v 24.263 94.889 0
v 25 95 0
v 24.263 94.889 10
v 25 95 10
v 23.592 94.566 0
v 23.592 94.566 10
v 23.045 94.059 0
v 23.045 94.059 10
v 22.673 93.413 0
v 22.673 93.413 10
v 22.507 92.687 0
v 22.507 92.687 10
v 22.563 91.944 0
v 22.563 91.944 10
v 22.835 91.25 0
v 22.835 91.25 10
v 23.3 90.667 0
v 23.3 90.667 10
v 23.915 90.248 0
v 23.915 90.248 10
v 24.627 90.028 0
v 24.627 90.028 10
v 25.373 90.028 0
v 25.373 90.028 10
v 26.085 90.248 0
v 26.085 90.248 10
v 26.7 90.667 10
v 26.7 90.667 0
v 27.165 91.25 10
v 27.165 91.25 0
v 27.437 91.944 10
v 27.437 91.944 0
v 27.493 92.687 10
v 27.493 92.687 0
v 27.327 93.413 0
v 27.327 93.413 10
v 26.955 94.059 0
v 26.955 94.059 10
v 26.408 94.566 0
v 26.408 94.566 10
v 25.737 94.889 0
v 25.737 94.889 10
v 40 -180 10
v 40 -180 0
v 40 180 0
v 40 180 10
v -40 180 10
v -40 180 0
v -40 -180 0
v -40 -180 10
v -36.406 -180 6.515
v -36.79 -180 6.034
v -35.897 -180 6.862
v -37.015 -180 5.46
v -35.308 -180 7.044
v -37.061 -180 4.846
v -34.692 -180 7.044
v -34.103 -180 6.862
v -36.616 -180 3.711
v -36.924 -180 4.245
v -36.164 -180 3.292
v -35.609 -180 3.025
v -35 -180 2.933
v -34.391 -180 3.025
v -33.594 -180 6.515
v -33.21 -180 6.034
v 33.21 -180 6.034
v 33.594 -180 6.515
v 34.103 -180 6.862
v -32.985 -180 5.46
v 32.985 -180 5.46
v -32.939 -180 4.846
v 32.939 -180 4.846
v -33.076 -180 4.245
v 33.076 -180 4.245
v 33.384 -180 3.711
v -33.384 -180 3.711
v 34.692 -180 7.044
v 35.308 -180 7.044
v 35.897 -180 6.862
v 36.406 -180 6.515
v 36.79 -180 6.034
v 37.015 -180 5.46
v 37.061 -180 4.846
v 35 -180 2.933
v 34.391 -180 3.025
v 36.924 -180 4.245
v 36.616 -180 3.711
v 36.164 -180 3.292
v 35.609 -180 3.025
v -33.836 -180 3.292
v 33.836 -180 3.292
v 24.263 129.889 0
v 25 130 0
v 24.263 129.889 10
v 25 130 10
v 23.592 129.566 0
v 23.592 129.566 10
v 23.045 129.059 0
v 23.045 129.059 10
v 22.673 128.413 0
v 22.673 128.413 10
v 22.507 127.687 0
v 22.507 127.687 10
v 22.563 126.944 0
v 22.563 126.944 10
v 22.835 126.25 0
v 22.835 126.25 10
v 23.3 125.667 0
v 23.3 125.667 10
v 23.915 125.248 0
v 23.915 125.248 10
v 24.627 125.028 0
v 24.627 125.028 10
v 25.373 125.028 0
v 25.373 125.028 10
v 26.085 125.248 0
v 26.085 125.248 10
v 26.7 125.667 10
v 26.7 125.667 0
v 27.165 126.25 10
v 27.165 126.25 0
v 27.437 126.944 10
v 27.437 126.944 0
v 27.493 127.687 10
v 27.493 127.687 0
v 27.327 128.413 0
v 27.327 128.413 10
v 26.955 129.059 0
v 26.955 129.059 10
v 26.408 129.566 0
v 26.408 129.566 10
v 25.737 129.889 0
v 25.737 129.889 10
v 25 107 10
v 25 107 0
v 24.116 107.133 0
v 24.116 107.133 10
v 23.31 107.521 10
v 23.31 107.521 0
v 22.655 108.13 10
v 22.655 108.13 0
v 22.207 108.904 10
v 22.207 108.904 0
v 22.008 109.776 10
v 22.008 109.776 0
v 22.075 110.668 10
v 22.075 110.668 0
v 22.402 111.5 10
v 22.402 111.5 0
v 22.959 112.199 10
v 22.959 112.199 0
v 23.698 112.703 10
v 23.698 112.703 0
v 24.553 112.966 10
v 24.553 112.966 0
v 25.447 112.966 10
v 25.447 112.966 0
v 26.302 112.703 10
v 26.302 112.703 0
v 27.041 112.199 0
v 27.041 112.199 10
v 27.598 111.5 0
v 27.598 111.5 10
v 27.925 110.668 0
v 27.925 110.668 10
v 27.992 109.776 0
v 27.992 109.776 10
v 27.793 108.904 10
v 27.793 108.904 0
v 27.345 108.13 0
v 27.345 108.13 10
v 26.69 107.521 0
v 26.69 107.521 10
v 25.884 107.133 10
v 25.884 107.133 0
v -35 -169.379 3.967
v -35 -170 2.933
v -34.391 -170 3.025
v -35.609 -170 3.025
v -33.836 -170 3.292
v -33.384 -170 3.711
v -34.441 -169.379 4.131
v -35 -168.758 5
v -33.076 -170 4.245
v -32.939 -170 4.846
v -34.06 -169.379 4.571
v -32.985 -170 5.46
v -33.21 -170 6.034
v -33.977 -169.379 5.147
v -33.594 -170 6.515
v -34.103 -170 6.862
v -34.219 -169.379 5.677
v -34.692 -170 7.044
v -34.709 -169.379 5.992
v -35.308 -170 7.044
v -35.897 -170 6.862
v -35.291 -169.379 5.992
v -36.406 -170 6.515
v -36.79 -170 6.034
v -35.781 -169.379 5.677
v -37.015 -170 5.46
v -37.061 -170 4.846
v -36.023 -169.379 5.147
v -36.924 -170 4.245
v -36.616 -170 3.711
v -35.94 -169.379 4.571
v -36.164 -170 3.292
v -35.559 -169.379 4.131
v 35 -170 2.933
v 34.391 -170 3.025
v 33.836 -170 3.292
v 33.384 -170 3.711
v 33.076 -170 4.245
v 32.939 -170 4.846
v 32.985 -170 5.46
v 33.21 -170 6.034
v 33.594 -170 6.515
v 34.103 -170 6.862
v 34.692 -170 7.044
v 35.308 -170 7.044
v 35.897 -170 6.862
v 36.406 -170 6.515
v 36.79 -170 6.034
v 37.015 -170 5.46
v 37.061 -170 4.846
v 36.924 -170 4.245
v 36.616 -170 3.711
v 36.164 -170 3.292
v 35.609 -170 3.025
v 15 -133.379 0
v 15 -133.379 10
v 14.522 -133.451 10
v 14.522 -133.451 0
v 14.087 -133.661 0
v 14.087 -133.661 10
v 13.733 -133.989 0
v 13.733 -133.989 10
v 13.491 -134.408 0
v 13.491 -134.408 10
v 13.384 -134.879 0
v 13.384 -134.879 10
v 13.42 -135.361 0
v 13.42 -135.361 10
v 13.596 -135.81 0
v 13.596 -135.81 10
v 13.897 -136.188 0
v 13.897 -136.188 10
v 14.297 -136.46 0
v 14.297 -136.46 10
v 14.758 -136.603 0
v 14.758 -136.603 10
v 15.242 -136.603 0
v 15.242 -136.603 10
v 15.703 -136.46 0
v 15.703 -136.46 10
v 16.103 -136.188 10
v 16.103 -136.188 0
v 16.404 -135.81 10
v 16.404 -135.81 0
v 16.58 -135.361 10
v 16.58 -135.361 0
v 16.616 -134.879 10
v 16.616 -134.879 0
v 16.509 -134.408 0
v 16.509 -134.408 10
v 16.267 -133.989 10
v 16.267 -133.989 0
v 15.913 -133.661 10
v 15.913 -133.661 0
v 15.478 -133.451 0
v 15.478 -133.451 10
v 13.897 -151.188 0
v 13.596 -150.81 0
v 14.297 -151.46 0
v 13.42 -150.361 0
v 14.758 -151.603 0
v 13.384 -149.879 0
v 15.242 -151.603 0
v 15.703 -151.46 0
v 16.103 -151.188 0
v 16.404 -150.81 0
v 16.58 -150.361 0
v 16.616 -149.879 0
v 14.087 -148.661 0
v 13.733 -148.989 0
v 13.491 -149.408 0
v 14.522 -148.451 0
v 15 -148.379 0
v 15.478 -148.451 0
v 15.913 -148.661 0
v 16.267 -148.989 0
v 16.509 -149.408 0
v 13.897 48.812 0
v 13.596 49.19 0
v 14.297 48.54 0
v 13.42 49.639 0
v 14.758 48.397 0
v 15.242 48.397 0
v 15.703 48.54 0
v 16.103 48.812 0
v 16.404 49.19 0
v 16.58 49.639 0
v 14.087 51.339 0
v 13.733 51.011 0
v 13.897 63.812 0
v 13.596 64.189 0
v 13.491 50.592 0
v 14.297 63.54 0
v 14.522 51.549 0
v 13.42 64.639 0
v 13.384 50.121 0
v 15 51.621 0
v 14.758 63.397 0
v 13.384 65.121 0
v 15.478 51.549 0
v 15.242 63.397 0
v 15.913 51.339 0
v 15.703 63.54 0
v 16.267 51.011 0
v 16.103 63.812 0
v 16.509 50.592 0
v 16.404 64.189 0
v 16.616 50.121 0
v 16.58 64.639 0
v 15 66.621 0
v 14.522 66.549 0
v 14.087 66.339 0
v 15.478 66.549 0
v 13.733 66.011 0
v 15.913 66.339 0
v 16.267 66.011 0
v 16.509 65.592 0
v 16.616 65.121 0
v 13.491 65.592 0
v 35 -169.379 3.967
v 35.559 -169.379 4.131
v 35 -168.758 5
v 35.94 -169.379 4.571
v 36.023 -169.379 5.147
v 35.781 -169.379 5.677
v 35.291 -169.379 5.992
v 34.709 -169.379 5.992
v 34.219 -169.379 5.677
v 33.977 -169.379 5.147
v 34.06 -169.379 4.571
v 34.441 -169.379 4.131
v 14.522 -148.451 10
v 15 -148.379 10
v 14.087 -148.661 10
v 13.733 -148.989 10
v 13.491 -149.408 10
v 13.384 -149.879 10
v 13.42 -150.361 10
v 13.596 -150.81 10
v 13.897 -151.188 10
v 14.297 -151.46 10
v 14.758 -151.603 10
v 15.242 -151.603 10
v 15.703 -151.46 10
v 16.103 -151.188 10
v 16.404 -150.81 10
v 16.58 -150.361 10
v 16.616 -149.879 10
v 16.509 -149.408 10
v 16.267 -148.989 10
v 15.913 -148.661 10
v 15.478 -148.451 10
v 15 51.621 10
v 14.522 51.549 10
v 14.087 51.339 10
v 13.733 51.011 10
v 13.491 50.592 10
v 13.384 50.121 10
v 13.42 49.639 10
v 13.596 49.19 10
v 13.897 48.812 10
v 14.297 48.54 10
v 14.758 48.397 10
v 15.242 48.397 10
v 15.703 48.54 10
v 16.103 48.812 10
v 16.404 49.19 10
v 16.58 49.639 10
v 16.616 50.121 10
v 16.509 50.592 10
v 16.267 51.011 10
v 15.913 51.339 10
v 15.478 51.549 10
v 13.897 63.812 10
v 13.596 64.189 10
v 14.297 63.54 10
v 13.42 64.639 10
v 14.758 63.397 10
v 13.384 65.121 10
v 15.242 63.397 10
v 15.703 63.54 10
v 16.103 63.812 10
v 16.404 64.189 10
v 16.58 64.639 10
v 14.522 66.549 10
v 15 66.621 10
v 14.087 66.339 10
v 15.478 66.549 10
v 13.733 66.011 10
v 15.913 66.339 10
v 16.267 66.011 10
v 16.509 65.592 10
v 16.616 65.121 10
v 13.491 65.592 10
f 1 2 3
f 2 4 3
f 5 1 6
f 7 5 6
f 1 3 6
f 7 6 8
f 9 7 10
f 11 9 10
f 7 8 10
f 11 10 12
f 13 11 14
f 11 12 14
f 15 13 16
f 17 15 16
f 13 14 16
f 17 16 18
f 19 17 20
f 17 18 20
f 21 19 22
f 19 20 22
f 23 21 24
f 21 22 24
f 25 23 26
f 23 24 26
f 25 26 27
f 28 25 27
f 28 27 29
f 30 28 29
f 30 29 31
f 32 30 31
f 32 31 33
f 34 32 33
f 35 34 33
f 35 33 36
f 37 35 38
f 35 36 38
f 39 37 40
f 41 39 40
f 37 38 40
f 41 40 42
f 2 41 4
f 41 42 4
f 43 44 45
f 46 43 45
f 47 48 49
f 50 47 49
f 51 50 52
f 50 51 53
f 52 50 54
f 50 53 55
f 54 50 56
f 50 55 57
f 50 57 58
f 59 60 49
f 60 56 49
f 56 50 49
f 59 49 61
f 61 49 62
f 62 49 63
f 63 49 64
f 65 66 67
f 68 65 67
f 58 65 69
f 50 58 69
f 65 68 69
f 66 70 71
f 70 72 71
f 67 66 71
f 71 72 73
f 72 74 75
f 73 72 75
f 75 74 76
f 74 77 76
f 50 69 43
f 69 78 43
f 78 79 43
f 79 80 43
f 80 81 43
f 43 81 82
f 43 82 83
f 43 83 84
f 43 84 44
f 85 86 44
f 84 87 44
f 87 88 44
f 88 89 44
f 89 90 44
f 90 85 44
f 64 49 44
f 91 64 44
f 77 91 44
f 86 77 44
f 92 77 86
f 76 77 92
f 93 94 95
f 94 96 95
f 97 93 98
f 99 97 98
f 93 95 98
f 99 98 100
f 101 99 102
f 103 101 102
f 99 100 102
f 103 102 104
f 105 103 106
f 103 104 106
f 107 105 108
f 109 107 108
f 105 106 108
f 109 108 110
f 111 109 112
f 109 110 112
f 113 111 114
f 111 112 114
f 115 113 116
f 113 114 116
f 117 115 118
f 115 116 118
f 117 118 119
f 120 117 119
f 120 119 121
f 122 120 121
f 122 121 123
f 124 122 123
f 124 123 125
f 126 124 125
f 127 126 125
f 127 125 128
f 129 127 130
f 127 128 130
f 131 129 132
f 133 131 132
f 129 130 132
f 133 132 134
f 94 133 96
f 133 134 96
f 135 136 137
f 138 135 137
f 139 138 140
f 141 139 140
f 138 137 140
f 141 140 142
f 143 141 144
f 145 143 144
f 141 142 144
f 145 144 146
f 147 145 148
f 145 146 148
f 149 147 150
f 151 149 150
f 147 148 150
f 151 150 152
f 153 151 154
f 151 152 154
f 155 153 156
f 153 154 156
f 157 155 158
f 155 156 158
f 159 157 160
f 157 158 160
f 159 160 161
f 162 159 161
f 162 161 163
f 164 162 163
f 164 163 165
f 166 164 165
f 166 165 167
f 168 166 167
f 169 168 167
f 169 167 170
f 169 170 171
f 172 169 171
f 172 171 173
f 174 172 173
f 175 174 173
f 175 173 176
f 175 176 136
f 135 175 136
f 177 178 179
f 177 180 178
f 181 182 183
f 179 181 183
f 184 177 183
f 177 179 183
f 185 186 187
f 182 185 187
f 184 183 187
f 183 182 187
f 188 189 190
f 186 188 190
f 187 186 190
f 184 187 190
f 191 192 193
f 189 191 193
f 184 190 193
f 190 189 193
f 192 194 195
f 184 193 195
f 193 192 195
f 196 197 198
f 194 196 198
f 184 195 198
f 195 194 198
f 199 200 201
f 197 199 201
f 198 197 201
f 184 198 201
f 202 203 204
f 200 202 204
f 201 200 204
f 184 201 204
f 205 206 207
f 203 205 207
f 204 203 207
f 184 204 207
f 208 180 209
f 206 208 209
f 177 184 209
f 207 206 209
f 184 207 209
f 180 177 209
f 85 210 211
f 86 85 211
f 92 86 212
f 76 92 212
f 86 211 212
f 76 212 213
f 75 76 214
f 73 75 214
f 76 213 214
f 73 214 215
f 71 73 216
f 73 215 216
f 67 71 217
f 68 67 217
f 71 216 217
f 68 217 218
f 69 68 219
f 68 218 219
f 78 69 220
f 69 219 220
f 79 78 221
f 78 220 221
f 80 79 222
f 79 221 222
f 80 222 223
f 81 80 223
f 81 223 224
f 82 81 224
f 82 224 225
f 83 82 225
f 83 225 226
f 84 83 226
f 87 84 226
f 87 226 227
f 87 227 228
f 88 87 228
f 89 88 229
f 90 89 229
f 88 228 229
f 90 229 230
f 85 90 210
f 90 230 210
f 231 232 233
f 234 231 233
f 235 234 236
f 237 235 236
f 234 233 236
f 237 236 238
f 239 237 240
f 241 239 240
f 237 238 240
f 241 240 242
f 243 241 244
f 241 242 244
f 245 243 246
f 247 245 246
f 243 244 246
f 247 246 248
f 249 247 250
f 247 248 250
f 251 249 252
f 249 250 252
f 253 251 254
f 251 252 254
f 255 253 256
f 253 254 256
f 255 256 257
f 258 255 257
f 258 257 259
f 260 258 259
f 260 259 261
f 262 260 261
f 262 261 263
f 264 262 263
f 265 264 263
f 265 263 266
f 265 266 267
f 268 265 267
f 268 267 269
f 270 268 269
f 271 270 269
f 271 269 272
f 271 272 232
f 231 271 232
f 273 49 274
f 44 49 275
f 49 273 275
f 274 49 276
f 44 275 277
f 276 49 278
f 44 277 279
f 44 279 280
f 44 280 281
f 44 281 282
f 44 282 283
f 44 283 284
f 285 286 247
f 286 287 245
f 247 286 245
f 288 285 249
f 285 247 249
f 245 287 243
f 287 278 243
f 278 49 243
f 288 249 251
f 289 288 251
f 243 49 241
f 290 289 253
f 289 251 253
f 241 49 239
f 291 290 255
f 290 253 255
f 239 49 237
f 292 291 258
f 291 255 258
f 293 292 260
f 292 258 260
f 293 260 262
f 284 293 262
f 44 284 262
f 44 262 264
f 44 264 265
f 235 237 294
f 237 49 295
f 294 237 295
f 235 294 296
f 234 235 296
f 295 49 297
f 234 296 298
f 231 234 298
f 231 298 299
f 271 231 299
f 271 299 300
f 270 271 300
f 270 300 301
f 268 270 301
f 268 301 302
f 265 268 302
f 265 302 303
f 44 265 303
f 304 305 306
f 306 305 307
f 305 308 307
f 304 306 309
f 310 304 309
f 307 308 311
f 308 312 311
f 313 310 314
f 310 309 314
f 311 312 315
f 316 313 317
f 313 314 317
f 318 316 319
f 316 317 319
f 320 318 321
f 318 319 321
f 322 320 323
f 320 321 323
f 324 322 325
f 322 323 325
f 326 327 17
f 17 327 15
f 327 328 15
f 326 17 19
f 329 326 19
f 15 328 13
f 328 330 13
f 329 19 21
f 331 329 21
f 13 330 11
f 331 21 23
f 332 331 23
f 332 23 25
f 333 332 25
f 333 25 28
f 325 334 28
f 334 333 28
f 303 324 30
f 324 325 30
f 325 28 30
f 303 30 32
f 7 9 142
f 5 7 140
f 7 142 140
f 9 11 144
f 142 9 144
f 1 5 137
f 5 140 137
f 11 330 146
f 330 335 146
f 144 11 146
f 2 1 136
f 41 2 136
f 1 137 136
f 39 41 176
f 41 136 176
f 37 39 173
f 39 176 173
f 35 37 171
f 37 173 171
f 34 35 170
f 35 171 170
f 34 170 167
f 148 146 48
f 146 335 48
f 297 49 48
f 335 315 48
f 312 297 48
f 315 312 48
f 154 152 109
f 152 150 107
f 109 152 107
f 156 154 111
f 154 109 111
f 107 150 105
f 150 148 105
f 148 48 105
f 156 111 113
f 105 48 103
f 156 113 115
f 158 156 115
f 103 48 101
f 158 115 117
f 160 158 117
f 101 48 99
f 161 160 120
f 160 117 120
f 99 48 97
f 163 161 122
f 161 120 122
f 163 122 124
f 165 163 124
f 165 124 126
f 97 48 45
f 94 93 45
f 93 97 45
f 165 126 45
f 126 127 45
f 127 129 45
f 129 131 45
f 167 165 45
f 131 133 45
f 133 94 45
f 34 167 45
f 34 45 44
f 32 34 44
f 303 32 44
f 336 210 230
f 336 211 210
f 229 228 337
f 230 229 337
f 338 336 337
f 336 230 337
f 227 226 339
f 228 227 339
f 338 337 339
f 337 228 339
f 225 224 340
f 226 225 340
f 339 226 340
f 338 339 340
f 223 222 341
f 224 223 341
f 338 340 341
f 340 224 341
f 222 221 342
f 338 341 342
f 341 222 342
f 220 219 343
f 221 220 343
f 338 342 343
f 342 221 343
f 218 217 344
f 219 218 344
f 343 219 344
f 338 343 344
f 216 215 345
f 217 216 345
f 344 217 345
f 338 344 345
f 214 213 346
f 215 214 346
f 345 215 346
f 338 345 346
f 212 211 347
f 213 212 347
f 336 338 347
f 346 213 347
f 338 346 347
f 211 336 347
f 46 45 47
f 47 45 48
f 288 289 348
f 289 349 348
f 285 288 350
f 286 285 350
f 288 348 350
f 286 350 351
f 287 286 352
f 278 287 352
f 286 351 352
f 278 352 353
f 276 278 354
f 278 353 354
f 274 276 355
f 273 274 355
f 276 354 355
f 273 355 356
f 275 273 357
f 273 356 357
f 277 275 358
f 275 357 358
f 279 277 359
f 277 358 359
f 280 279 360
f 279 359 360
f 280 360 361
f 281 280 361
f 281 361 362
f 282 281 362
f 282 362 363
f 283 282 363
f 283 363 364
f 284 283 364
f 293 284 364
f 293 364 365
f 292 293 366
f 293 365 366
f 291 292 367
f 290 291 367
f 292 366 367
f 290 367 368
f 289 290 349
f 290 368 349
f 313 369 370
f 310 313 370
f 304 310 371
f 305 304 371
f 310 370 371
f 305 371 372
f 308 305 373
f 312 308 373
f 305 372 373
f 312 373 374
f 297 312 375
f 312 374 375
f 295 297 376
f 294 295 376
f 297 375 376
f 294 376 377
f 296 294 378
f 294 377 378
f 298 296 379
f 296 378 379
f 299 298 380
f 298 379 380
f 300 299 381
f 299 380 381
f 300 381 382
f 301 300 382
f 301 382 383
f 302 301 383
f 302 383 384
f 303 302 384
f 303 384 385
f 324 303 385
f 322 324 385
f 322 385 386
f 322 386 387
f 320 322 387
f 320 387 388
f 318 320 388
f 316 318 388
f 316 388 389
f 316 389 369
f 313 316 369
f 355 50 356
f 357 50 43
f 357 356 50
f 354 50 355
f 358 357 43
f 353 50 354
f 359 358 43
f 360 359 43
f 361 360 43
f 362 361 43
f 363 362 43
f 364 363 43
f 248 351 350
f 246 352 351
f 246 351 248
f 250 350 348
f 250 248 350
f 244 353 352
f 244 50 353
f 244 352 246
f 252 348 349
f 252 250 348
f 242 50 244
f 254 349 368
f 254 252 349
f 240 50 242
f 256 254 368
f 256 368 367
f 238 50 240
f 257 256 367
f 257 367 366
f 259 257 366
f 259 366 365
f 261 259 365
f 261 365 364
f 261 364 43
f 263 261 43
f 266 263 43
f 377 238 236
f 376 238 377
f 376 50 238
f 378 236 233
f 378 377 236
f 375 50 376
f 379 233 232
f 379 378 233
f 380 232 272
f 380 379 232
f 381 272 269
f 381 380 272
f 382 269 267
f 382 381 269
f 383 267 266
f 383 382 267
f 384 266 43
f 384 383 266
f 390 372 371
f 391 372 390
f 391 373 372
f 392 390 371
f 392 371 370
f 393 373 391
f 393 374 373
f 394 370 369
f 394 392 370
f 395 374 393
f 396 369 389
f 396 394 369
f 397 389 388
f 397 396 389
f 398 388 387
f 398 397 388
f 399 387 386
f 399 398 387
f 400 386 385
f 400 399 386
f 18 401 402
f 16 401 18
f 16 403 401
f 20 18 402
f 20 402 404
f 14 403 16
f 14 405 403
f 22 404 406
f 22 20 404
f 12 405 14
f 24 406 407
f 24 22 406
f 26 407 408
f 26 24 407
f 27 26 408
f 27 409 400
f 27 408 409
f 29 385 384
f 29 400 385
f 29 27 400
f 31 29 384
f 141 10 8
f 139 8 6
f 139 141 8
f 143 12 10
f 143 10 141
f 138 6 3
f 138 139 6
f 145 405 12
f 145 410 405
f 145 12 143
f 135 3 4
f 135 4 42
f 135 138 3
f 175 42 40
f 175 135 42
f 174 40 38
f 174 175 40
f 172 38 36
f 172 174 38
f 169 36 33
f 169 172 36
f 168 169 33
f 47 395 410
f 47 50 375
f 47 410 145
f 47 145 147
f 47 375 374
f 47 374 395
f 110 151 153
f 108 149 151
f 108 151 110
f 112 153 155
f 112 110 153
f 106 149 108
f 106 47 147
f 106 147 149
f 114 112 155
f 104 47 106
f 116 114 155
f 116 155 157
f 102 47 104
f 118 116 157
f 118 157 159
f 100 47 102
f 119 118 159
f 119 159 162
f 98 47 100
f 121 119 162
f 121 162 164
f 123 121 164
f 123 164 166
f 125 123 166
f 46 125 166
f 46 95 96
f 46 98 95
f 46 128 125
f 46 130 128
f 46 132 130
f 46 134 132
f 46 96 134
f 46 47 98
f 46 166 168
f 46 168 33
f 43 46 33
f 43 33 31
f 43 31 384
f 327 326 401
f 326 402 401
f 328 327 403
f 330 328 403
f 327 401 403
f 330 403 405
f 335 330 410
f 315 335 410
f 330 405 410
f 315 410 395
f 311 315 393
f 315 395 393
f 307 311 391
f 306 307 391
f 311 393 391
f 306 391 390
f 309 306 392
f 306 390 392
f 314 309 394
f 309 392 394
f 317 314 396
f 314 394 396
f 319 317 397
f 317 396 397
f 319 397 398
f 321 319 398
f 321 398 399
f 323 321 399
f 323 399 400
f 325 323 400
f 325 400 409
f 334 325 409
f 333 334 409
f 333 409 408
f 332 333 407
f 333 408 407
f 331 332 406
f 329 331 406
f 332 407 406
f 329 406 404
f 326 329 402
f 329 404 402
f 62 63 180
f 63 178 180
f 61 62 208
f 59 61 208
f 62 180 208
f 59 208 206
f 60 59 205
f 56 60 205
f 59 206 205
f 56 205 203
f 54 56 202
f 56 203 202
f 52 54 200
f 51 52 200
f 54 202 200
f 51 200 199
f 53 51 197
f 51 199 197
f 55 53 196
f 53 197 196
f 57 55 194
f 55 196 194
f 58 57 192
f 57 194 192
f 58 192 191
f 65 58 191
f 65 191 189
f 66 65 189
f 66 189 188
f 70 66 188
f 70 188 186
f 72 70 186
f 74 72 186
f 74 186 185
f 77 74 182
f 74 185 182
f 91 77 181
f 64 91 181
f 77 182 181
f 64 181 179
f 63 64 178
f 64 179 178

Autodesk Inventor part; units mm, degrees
ref_plane "YZ Plane" through (0, 0, 0) normal (1, 0, 0) x (0, 1, 0)
ref_plane "XZ Plane" through (0, 0, 0) normal (0, 1, 0) x (-1, 0, 0)
ref_plane "XY Plane" through (0, 0, 0) normal (0, 0, 1) x (1, 0, 0)
sketch "Skizze1" plane through (0, 0, 0) normal (0, 0, 1) x (1, 0, 0)
  line L0 (40, 180) -> (-40, 180)
  line L1 (-40, 180) -> (-40, -180)
  line L2 (-40, -180) -> (40, -180)
  line L3 (40, -180) -> (40, 180)
  line L4 (40, 180) -> (-40, -180) construction
  line L5 (-40, 180) -> (40, -180) construction
  point P0 (0, 0)
  dimension "d0" = 80
  dimension "d1" = 360
extrude "Extrusion1" add sketch "Skizze1" along normal blind 10
sketch "Skizze2" plane through (0, 0, 10) normal (0, 0, 1) x (1, 0, 0)
  line L0 (40, 180) -> (-40, 180) projected
  line L1 (40, -180) -> (40, 180) projected
  point P0 (0, 0)
  point P1 (25, 110)
  dimension "d16" = 15
  dimension "d17" = 70
hole "Bohrung2" at (25, 110, 10) direction (0, 0, -1) diameter 6 end through all
sketch "Skizze4" plane through (0, 0, 0) normal (0, 0, -1) x (-1, 0, 0)
  line L0 (40, -180) -> (-40, -180) projected
  line L1 (40, 180) -> (40, -180) projected
  line L2 (-15, -150) -> (-15, -135) construction
  point P0 (0, 0)
  dimension "d34" = 15
  dimension "d35" = 30
  dimension "d36" = 55
hole "Bohrung4" at (15, -150, 0) at (15, -135, 0) direction (0, 0, 1) diameter 3.242 end through all thread size "M4x0.7" class "6H" standard "ISO Metric profile"
pattern_linear "Rechteckige Anordnung2" count 2 spacing 200 along (0, 1, 0) of "Bohrung4"
sketch "Skizze5" plane through (-40, -180, 0) normal (0, -1, 0) x (1, 0, 0)
  line L0 (0, 0) -> (80, 0) projected
  line L1 (0, 0) -> (0, 10) projected
  line L2 (5, 5) -> (75, 5)
  point P0 (40, 0)
  point P1 (40, 5)
  point P2 (40, 0)
  point P3 (0, 5)
  dimension "d47" = 5
hole "Bohrung5" at (-35, -180, 5) at (35, -180, 5) direction (0, 1, 0) diameter 4.134 depth 10 tip angle 118 thread size "M5x0.8" class "6H" standard "ISO Metric profile"
sketch "Skizze6" plane through (0, 0, 0) normal (0, 0, -1) x (-1, 0, 0)
  circle A0 centre (-25, 110) radius 3 projected
  line L0 (40, 180) -> (40, -180) projected
  line L1 (-25, 127.5) -> (-25, 92.5)
  point P0 (0, 0)
  dimension "d55" = 35
hole "Bohrung6" at (25, 127.5, 0) at (25, 92.5, 0) direction (0, 0, 1) diameter 5 end through all
properties part number "Tunel_SidePanel2" material "Polycarbonat, klar"
